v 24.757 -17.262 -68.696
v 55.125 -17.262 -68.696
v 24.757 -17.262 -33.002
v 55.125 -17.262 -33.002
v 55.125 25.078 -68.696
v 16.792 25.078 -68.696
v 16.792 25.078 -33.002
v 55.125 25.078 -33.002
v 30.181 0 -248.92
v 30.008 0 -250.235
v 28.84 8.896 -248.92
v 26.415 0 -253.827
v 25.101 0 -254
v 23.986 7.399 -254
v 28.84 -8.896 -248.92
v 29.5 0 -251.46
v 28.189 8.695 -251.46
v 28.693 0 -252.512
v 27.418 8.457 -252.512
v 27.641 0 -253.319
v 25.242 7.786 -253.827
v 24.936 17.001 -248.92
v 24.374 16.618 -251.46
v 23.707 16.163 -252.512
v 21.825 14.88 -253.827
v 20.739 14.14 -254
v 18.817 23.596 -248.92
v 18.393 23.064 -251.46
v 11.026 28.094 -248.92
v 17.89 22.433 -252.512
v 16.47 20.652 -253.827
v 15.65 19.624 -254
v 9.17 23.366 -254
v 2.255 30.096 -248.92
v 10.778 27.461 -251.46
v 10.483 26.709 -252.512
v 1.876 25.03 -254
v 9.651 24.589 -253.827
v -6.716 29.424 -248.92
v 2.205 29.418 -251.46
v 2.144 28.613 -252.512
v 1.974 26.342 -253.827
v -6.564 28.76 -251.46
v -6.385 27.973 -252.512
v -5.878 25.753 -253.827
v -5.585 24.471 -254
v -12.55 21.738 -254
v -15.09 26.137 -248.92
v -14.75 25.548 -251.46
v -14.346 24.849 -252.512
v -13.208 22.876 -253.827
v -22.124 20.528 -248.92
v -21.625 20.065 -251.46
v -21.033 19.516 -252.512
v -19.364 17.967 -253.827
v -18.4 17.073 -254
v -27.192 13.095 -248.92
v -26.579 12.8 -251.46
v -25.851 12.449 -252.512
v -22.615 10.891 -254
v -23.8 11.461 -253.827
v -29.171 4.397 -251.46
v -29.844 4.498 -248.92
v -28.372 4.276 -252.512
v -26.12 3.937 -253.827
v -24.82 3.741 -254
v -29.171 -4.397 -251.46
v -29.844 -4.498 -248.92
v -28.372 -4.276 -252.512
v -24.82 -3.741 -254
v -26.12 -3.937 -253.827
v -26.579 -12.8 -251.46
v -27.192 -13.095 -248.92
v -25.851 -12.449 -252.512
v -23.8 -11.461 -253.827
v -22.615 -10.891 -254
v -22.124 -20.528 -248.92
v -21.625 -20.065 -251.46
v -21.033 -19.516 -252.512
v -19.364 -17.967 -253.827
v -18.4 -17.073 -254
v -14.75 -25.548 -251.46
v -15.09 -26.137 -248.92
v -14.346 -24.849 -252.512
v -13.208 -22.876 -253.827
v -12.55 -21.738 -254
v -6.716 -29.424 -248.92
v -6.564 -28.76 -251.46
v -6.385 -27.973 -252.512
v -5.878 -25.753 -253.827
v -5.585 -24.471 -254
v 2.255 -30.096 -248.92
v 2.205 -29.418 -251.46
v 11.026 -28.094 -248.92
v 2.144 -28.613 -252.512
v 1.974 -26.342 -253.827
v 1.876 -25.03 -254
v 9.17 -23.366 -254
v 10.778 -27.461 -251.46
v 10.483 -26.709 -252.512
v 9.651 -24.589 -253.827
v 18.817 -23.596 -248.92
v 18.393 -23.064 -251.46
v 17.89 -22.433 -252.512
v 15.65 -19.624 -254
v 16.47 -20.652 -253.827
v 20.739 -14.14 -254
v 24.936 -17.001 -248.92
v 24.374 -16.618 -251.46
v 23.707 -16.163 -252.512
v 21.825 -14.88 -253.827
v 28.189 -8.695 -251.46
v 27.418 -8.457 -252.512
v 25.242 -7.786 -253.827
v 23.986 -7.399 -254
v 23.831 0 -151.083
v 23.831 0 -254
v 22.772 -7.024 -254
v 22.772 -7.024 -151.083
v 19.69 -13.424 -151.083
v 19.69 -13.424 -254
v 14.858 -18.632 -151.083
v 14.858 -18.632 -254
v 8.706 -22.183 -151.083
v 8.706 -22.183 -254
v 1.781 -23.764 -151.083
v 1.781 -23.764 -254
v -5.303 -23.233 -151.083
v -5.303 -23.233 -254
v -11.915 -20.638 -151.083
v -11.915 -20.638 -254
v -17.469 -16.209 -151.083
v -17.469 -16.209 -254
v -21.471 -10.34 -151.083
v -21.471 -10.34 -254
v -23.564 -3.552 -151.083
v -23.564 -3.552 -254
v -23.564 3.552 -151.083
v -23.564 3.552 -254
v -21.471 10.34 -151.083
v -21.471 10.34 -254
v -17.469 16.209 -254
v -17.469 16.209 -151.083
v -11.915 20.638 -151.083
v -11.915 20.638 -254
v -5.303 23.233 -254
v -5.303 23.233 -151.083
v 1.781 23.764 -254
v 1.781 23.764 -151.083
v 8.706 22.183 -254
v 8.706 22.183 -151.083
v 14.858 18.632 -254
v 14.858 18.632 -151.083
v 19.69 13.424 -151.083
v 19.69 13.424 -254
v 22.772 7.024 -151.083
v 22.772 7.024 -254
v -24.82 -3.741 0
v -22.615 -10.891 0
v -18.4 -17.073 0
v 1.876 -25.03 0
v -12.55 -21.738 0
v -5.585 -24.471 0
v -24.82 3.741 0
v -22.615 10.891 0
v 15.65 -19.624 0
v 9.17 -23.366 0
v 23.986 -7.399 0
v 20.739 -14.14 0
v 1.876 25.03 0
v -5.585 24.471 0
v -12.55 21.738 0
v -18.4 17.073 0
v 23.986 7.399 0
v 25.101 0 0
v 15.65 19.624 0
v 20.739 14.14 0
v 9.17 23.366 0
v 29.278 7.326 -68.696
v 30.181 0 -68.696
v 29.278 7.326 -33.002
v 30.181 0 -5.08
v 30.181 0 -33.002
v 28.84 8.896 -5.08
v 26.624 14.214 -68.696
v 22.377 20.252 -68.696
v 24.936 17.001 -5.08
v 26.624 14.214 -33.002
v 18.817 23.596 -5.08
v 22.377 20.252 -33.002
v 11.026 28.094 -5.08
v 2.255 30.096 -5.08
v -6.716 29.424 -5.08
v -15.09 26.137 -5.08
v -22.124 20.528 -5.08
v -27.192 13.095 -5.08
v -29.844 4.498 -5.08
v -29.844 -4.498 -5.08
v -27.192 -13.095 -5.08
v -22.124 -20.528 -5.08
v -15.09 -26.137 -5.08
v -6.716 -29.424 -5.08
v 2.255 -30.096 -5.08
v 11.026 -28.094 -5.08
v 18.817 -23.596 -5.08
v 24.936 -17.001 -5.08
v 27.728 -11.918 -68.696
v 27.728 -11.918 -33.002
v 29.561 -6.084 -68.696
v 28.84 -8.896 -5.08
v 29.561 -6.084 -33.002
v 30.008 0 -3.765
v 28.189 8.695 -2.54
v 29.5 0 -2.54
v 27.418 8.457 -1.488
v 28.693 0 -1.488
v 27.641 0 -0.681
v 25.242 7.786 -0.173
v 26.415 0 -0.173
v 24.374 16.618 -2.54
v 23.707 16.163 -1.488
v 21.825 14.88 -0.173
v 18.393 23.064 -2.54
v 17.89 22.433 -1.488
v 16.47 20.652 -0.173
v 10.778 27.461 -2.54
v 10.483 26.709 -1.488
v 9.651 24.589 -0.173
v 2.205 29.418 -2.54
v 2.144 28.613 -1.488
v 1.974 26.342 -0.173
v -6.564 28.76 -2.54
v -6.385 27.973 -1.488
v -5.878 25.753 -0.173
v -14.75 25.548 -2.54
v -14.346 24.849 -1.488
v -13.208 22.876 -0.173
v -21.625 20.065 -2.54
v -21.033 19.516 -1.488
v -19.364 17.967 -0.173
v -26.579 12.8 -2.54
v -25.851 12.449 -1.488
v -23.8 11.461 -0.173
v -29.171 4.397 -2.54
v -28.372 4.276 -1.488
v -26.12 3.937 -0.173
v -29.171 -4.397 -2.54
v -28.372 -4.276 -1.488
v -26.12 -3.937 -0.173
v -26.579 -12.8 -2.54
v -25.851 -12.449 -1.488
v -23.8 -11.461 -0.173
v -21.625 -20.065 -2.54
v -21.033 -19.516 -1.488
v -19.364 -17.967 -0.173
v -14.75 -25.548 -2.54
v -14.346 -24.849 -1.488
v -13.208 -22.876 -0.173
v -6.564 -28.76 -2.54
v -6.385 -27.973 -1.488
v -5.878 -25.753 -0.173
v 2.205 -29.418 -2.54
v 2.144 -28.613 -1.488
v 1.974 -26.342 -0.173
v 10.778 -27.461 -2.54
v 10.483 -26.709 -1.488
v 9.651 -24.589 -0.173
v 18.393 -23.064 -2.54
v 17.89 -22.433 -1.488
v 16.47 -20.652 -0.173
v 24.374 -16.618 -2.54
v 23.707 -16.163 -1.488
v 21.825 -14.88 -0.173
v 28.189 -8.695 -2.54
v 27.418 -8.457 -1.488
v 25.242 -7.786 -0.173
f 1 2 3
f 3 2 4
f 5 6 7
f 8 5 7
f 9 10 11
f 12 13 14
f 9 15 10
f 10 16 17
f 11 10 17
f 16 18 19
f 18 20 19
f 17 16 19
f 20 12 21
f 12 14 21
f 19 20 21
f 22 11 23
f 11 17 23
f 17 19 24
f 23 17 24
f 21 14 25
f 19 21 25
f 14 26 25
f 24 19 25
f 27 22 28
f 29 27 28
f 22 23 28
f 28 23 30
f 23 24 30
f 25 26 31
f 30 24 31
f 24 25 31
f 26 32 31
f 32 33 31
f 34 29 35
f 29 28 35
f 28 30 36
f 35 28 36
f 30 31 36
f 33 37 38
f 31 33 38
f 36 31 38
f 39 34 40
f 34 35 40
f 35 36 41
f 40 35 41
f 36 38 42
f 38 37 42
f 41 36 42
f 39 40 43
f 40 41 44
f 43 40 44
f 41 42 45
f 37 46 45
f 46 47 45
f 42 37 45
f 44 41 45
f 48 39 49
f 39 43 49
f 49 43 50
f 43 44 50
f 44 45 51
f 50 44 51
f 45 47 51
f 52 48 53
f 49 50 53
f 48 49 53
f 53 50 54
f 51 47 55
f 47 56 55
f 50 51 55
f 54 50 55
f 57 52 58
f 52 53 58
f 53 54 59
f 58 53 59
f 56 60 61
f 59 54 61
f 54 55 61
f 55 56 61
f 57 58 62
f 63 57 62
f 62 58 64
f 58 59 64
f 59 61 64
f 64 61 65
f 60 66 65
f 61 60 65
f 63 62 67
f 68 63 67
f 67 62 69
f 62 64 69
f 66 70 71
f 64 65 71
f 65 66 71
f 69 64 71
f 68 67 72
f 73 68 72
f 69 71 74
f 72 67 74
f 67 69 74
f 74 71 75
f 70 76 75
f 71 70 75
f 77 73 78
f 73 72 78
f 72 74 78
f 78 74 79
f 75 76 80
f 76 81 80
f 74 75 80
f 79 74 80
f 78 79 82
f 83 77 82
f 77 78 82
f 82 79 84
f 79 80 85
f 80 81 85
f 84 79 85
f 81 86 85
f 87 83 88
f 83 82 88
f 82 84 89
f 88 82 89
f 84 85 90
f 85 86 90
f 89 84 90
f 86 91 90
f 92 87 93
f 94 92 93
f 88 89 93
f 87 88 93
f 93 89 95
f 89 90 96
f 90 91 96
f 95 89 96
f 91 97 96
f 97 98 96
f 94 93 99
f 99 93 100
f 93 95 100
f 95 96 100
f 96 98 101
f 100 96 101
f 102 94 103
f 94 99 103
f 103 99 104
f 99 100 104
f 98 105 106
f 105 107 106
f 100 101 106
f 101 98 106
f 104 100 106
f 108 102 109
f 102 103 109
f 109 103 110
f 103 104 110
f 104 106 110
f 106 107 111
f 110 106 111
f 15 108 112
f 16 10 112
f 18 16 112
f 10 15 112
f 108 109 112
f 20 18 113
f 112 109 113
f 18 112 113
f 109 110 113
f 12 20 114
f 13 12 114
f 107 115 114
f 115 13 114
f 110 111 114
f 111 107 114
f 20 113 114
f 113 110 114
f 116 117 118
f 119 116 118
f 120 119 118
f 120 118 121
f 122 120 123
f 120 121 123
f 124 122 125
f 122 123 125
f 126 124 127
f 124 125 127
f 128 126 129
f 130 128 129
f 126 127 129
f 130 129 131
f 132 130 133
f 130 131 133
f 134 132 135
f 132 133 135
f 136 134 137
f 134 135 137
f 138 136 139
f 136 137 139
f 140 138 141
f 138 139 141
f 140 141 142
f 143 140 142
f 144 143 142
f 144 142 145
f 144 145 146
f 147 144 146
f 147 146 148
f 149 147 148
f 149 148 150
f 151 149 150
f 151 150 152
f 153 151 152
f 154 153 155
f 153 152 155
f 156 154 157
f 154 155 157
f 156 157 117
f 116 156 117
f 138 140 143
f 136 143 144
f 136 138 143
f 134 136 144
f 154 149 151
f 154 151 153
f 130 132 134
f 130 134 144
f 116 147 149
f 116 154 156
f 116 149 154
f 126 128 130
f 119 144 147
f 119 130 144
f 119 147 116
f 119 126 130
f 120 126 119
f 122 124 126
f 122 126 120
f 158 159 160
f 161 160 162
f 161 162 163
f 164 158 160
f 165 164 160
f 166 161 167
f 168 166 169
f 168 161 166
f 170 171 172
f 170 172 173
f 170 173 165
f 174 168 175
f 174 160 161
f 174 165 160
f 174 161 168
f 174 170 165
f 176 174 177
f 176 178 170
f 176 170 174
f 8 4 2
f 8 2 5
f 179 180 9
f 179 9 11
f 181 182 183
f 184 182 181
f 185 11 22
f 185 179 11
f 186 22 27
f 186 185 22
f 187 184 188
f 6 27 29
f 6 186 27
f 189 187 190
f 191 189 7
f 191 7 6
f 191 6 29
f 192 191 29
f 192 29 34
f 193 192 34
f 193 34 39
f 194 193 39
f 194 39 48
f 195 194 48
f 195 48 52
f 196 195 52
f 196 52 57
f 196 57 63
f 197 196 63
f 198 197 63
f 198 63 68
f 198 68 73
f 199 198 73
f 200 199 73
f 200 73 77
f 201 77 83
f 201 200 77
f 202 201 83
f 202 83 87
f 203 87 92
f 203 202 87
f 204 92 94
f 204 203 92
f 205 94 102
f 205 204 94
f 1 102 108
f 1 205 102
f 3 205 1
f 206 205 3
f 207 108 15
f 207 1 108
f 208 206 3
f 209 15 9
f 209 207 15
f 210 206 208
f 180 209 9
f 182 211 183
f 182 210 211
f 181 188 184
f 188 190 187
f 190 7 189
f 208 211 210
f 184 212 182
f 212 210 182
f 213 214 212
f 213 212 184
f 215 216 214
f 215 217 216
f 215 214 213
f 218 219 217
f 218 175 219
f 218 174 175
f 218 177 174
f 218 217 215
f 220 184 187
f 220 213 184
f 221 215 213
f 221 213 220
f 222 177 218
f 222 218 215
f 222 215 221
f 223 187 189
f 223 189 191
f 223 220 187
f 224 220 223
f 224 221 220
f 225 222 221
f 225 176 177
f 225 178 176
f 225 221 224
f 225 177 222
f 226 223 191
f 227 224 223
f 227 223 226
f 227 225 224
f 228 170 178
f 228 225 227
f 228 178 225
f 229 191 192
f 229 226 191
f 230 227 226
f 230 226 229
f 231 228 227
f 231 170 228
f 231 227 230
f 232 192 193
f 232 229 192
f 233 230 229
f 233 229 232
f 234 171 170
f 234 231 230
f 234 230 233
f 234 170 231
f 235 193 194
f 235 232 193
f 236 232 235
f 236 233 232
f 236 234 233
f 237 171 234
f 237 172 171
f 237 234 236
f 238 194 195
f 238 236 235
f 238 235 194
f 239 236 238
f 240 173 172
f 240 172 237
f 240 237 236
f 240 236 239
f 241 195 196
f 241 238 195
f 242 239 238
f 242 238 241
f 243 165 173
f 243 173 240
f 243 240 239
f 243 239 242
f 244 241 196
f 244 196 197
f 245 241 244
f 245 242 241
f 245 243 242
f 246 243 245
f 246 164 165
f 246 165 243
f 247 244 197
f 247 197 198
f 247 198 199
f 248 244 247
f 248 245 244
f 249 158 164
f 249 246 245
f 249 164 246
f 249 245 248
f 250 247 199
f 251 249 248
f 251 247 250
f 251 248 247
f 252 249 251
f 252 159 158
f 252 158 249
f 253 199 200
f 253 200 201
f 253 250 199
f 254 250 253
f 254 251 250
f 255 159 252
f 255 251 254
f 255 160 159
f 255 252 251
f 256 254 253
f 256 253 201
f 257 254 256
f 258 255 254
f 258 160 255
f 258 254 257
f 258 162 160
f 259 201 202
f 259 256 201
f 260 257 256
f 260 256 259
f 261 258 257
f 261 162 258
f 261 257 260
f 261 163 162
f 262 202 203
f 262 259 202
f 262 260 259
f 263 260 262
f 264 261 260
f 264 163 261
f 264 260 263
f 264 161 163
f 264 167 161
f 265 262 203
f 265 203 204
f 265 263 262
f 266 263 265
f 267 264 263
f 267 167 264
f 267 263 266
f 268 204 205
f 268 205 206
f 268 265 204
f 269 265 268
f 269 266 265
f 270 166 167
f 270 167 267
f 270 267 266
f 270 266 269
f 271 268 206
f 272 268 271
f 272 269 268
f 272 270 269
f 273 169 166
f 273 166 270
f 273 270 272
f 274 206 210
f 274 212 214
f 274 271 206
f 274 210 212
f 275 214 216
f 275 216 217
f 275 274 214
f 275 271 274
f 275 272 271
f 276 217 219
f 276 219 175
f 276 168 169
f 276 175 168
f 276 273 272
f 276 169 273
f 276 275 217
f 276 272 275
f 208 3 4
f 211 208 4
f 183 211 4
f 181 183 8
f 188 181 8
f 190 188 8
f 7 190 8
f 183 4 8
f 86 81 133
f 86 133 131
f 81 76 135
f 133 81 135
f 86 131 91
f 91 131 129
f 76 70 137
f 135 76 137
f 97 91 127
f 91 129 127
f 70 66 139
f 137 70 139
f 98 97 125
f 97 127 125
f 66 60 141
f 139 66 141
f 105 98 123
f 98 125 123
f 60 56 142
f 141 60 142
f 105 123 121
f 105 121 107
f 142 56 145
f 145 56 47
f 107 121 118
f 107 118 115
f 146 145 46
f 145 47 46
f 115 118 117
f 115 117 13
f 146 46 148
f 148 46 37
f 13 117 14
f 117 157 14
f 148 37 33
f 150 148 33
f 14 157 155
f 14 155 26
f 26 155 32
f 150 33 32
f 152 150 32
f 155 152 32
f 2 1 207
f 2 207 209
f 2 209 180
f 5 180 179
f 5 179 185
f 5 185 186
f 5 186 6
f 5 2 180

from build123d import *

# Parameters (mm, degrees)
F0_R     = 30.180652
F1_DEPTH = 254
F2_R     = 23.830652
F3_DEPTH = 102.916548
F4_R     = 5.08
F6_W     = 42.340428
F6_H     = 35.694406
F7_DEPTH = 45.834139


with BuildPart() as f1:
    # F0 (on Top) → F1 (new body)
    with BuildSketch(Plane.XY):
        Circle(F0_R)
    extrude(amount=-F1_DEPTH)

    # F2 (on face) → F3 (cut)
    with BuildSketch(Plane(origin=(0, 0, -254), x_dir=(1, 0, 0), z_dir=(0, 0, -1))):
        Circle(F2_R)
    extrude(amount=-F3_DEPTH, mode=Mode.SUBTRACT)

    # F4
    f4_edges = [f1.edges().sort_by_distance(p)[0] for p in [
        (30.180652, 0, -127),
        (-30.180652, 0, 0),
        (-30.180652, 0, -254),
    ]]
    fillet(f4_edges, radius=F4_R)

    # F6 (on offset) → F7 (join)
    with BuildSketch(Plane.YZ.offset(55.124739)):
        with Locations((3.907934, -50.849177)):
            Rectangle(F6_W, F6_H)
    extrude(amount=-F7_DEPTH)


solid = f1.part
